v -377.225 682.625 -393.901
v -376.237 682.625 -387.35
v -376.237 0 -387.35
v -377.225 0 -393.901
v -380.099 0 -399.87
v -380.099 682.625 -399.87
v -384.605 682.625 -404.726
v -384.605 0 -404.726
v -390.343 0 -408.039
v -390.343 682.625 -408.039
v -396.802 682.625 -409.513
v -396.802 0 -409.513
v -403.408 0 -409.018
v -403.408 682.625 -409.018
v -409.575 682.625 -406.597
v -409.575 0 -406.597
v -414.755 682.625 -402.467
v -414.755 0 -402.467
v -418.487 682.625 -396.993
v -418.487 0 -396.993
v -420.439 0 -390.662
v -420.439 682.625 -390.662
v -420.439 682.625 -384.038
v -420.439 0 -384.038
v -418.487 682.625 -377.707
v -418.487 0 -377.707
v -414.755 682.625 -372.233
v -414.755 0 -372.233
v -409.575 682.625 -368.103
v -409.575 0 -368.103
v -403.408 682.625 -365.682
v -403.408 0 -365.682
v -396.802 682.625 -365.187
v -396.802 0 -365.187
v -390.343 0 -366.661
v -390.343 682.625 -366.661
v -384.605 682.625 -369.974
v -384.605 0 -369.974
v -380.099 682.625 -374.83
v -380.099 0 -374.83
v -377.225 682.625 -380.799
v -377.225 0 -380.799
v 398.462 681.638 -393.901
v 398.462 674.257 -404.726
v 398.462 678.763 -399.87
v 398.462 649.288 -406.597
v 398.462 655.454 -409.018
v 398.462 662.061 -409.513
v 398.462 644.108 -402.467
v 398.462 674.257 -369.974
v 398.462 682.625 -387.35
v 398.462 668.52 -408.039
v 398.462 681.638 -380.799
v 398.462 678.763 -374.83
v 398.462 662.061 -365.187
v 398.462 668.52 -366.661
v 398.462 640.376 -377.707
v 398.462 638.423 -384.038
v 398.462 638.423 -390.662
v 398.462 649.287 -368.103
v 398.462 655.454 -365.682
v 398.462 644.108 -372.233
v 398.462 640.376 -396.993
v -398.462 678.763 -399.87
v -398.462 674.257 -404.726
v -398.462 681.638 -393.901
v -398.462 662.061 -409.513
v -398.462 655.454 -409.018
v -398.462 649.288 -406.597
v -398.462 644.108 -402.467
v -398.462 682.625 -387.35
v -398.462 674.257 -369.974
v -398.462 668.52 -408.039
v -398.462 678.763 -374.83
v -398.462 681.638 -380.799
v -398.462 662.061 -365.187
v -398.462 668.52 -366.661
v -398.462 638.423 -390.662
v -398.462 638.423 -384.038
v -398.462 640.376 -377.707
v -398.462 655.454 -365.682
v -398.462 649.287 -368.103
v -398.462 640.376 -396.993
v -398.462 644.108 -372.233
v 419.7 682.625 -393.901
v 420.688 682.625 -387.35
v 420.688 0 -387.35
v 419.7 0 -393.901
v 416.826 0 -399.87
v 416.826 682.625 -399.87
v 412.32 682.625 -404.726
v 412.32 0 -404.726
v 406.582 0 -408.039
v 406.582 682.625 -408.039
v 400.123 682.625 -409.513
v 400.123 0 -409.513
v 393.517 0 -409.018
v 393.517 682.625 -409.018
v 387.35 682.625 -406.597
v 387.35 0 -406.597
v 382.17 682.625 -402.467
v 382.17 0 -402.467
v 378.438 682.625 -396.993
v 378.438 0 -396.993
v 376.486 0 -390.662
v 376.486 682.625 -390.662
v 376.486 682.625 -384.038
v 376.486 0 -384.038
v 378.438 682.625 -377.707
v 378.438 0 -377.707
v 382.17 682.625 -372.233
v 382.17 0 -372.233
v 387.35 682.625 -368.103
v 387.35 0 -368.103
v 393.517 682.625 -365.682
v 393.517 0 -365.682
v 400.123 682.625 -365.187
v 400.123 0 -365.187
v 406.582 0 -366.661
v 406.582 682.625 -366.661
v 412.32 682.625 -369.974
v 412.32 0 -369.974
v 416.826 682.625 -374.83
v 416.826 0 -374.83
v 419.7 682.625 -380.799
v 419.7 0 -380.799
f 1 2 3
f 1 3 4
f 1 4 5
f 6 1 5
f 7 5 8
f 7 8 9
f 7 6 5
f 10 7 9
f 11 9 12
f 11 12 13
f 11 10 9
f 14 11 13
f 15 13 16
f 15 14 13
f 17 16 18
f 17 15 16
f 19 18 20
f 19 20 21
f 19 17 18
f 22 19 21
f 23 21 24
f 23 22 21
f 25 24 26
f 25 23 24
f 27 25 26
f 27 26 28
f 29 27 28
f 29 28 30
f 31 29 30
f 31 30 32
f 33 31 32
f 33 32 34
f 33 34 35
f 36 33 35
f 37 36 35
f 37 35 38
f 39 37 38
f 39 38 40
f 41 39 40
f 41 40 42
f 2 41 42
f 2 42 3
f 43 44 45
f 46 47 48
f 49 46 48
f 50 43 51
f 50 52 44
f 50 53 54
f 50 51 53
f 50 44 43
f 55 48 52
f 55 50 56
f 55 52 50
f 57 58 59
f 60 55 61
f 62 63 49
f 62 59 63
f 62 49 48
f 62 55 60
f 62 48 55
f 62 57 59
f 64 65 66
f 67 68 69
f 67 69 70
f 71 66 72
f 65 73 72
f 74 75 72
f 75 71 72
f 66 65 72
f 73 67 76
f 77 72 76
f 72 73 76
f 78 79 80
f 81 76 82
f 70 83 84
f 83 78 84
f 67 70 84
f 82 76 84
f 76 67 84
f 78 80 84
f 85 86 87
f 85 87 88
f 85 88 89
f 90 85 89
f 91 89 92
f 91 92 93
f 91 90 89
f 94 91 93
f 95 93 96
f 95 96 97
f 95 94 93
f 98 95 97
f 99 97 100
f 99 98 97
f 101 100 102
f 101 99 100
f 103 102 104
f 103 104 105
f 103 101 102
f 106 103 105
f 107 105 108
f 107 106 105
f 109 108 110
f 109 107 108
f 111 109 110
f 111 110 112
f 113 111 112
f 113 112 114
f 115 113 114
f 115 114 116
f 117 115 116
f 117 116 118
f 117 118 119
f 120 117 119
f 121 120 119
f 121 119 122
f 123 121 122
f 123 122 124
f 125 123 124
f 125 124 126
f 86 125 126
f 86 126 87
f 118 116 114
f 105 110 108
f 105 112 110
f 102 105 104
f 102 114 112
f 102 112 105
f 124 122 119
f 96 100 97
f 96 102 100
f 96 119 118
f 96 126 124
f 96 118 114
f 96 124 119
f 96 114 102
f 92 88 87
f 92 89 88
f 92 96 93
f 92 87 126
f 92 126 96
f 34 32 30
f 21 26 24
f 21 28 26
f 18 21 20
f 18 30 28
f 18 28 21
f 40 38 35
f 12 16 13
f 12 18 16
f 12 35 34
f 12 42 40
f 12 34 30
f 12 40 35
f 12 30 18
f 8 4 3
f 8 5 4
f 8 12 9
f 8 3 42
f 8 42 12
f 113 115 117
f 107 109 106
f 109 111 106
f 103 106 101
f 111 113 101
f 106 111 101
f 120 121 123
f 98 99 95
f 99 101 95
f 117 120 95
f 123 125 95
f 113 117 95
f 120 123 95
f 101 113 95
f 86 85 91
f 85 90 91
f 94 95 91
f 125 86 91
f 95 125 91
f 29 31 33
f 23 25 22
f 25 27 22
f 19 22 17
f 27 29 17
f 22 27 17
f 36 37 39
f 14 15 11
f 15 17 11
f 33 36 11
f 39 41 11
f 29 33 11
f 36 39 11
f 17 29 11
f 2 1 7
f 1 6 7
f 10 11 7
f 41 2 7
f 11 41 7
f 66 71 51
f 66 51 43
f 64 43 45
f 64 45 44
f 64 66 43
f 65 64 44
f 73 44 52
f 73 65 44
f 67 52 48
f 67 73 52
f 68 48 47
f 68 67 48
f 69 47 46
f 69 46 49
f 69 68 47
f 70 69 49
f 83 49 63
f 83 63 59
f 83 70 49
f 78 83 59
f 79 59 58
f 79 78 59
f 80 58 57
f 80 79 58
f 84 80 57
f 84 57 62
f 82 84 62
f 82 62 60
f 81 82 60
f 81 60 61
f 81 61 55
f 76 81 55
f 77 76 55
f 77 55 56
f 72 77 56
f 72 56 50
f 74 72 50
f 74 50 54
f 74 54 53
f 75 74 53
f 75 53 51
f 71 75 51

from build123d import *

# Parameters (mm, degrees)
F1_R = 22.225
F4_R = 22.225


with BuildPart() as f5:
    # F5: sweep along a path in F3
    with BuildLine(Plane(origin=(0, 0, -387.35), x_dir=(1, 0, 0), z_dir=(0, 0, -1))) as f5_path:
        Line((-398.4625, 0), (-398.4625, -660.4))
        Line((-398.4625, -660.4), (-398.4625, -682.625))
    # F1 (on Front) → F5 (sweep)
    with BuildSketch(Plane.XZ):
        with Locations((-398.4625, -387.35)):
            Circle(F1_R)
    sweep(path=f5_path.line)


with BuildPart() as f6:
    # F6: sweep along a path in F3
    with BuildLine(Plane(origin=(0, 0, -387.35), x_dir=(1, 0, 0), z_dir=(0, 0, -1))) as f6_path:
        Line((398.4625, 0), (398.4625, -660.4))
        Line((398.4625, -660.4), (398.4625, -682.625))
    # F1 (on Front) → F6 (sweep)
    with BuildSketch(Plane.XZ):
        with Locations((398.4625, -387.35)):
            Circle(F1_R)
    sweep(path=f6_path.line)


with BuildPart() as f7:
    # F7: sweep along a path in F3
    with BuildLine(Plane(origin=(0, 0, -387.35), x_dir=(1, 0, 0), z_dir=(0, 0, -1))) as f7_path:
        Line((398.4625, -660.4), (-398.4625, -660.4))
    # F4 (on Right) → F7 (sweep)
    with BuildSketch(Plane.YZ):
        with Locations((660.4, -387.35)):
            Circle(F4_R)
    sweep(path=f7_path.line)


solid = Compound([f5.part, f6.part, f7.part])
